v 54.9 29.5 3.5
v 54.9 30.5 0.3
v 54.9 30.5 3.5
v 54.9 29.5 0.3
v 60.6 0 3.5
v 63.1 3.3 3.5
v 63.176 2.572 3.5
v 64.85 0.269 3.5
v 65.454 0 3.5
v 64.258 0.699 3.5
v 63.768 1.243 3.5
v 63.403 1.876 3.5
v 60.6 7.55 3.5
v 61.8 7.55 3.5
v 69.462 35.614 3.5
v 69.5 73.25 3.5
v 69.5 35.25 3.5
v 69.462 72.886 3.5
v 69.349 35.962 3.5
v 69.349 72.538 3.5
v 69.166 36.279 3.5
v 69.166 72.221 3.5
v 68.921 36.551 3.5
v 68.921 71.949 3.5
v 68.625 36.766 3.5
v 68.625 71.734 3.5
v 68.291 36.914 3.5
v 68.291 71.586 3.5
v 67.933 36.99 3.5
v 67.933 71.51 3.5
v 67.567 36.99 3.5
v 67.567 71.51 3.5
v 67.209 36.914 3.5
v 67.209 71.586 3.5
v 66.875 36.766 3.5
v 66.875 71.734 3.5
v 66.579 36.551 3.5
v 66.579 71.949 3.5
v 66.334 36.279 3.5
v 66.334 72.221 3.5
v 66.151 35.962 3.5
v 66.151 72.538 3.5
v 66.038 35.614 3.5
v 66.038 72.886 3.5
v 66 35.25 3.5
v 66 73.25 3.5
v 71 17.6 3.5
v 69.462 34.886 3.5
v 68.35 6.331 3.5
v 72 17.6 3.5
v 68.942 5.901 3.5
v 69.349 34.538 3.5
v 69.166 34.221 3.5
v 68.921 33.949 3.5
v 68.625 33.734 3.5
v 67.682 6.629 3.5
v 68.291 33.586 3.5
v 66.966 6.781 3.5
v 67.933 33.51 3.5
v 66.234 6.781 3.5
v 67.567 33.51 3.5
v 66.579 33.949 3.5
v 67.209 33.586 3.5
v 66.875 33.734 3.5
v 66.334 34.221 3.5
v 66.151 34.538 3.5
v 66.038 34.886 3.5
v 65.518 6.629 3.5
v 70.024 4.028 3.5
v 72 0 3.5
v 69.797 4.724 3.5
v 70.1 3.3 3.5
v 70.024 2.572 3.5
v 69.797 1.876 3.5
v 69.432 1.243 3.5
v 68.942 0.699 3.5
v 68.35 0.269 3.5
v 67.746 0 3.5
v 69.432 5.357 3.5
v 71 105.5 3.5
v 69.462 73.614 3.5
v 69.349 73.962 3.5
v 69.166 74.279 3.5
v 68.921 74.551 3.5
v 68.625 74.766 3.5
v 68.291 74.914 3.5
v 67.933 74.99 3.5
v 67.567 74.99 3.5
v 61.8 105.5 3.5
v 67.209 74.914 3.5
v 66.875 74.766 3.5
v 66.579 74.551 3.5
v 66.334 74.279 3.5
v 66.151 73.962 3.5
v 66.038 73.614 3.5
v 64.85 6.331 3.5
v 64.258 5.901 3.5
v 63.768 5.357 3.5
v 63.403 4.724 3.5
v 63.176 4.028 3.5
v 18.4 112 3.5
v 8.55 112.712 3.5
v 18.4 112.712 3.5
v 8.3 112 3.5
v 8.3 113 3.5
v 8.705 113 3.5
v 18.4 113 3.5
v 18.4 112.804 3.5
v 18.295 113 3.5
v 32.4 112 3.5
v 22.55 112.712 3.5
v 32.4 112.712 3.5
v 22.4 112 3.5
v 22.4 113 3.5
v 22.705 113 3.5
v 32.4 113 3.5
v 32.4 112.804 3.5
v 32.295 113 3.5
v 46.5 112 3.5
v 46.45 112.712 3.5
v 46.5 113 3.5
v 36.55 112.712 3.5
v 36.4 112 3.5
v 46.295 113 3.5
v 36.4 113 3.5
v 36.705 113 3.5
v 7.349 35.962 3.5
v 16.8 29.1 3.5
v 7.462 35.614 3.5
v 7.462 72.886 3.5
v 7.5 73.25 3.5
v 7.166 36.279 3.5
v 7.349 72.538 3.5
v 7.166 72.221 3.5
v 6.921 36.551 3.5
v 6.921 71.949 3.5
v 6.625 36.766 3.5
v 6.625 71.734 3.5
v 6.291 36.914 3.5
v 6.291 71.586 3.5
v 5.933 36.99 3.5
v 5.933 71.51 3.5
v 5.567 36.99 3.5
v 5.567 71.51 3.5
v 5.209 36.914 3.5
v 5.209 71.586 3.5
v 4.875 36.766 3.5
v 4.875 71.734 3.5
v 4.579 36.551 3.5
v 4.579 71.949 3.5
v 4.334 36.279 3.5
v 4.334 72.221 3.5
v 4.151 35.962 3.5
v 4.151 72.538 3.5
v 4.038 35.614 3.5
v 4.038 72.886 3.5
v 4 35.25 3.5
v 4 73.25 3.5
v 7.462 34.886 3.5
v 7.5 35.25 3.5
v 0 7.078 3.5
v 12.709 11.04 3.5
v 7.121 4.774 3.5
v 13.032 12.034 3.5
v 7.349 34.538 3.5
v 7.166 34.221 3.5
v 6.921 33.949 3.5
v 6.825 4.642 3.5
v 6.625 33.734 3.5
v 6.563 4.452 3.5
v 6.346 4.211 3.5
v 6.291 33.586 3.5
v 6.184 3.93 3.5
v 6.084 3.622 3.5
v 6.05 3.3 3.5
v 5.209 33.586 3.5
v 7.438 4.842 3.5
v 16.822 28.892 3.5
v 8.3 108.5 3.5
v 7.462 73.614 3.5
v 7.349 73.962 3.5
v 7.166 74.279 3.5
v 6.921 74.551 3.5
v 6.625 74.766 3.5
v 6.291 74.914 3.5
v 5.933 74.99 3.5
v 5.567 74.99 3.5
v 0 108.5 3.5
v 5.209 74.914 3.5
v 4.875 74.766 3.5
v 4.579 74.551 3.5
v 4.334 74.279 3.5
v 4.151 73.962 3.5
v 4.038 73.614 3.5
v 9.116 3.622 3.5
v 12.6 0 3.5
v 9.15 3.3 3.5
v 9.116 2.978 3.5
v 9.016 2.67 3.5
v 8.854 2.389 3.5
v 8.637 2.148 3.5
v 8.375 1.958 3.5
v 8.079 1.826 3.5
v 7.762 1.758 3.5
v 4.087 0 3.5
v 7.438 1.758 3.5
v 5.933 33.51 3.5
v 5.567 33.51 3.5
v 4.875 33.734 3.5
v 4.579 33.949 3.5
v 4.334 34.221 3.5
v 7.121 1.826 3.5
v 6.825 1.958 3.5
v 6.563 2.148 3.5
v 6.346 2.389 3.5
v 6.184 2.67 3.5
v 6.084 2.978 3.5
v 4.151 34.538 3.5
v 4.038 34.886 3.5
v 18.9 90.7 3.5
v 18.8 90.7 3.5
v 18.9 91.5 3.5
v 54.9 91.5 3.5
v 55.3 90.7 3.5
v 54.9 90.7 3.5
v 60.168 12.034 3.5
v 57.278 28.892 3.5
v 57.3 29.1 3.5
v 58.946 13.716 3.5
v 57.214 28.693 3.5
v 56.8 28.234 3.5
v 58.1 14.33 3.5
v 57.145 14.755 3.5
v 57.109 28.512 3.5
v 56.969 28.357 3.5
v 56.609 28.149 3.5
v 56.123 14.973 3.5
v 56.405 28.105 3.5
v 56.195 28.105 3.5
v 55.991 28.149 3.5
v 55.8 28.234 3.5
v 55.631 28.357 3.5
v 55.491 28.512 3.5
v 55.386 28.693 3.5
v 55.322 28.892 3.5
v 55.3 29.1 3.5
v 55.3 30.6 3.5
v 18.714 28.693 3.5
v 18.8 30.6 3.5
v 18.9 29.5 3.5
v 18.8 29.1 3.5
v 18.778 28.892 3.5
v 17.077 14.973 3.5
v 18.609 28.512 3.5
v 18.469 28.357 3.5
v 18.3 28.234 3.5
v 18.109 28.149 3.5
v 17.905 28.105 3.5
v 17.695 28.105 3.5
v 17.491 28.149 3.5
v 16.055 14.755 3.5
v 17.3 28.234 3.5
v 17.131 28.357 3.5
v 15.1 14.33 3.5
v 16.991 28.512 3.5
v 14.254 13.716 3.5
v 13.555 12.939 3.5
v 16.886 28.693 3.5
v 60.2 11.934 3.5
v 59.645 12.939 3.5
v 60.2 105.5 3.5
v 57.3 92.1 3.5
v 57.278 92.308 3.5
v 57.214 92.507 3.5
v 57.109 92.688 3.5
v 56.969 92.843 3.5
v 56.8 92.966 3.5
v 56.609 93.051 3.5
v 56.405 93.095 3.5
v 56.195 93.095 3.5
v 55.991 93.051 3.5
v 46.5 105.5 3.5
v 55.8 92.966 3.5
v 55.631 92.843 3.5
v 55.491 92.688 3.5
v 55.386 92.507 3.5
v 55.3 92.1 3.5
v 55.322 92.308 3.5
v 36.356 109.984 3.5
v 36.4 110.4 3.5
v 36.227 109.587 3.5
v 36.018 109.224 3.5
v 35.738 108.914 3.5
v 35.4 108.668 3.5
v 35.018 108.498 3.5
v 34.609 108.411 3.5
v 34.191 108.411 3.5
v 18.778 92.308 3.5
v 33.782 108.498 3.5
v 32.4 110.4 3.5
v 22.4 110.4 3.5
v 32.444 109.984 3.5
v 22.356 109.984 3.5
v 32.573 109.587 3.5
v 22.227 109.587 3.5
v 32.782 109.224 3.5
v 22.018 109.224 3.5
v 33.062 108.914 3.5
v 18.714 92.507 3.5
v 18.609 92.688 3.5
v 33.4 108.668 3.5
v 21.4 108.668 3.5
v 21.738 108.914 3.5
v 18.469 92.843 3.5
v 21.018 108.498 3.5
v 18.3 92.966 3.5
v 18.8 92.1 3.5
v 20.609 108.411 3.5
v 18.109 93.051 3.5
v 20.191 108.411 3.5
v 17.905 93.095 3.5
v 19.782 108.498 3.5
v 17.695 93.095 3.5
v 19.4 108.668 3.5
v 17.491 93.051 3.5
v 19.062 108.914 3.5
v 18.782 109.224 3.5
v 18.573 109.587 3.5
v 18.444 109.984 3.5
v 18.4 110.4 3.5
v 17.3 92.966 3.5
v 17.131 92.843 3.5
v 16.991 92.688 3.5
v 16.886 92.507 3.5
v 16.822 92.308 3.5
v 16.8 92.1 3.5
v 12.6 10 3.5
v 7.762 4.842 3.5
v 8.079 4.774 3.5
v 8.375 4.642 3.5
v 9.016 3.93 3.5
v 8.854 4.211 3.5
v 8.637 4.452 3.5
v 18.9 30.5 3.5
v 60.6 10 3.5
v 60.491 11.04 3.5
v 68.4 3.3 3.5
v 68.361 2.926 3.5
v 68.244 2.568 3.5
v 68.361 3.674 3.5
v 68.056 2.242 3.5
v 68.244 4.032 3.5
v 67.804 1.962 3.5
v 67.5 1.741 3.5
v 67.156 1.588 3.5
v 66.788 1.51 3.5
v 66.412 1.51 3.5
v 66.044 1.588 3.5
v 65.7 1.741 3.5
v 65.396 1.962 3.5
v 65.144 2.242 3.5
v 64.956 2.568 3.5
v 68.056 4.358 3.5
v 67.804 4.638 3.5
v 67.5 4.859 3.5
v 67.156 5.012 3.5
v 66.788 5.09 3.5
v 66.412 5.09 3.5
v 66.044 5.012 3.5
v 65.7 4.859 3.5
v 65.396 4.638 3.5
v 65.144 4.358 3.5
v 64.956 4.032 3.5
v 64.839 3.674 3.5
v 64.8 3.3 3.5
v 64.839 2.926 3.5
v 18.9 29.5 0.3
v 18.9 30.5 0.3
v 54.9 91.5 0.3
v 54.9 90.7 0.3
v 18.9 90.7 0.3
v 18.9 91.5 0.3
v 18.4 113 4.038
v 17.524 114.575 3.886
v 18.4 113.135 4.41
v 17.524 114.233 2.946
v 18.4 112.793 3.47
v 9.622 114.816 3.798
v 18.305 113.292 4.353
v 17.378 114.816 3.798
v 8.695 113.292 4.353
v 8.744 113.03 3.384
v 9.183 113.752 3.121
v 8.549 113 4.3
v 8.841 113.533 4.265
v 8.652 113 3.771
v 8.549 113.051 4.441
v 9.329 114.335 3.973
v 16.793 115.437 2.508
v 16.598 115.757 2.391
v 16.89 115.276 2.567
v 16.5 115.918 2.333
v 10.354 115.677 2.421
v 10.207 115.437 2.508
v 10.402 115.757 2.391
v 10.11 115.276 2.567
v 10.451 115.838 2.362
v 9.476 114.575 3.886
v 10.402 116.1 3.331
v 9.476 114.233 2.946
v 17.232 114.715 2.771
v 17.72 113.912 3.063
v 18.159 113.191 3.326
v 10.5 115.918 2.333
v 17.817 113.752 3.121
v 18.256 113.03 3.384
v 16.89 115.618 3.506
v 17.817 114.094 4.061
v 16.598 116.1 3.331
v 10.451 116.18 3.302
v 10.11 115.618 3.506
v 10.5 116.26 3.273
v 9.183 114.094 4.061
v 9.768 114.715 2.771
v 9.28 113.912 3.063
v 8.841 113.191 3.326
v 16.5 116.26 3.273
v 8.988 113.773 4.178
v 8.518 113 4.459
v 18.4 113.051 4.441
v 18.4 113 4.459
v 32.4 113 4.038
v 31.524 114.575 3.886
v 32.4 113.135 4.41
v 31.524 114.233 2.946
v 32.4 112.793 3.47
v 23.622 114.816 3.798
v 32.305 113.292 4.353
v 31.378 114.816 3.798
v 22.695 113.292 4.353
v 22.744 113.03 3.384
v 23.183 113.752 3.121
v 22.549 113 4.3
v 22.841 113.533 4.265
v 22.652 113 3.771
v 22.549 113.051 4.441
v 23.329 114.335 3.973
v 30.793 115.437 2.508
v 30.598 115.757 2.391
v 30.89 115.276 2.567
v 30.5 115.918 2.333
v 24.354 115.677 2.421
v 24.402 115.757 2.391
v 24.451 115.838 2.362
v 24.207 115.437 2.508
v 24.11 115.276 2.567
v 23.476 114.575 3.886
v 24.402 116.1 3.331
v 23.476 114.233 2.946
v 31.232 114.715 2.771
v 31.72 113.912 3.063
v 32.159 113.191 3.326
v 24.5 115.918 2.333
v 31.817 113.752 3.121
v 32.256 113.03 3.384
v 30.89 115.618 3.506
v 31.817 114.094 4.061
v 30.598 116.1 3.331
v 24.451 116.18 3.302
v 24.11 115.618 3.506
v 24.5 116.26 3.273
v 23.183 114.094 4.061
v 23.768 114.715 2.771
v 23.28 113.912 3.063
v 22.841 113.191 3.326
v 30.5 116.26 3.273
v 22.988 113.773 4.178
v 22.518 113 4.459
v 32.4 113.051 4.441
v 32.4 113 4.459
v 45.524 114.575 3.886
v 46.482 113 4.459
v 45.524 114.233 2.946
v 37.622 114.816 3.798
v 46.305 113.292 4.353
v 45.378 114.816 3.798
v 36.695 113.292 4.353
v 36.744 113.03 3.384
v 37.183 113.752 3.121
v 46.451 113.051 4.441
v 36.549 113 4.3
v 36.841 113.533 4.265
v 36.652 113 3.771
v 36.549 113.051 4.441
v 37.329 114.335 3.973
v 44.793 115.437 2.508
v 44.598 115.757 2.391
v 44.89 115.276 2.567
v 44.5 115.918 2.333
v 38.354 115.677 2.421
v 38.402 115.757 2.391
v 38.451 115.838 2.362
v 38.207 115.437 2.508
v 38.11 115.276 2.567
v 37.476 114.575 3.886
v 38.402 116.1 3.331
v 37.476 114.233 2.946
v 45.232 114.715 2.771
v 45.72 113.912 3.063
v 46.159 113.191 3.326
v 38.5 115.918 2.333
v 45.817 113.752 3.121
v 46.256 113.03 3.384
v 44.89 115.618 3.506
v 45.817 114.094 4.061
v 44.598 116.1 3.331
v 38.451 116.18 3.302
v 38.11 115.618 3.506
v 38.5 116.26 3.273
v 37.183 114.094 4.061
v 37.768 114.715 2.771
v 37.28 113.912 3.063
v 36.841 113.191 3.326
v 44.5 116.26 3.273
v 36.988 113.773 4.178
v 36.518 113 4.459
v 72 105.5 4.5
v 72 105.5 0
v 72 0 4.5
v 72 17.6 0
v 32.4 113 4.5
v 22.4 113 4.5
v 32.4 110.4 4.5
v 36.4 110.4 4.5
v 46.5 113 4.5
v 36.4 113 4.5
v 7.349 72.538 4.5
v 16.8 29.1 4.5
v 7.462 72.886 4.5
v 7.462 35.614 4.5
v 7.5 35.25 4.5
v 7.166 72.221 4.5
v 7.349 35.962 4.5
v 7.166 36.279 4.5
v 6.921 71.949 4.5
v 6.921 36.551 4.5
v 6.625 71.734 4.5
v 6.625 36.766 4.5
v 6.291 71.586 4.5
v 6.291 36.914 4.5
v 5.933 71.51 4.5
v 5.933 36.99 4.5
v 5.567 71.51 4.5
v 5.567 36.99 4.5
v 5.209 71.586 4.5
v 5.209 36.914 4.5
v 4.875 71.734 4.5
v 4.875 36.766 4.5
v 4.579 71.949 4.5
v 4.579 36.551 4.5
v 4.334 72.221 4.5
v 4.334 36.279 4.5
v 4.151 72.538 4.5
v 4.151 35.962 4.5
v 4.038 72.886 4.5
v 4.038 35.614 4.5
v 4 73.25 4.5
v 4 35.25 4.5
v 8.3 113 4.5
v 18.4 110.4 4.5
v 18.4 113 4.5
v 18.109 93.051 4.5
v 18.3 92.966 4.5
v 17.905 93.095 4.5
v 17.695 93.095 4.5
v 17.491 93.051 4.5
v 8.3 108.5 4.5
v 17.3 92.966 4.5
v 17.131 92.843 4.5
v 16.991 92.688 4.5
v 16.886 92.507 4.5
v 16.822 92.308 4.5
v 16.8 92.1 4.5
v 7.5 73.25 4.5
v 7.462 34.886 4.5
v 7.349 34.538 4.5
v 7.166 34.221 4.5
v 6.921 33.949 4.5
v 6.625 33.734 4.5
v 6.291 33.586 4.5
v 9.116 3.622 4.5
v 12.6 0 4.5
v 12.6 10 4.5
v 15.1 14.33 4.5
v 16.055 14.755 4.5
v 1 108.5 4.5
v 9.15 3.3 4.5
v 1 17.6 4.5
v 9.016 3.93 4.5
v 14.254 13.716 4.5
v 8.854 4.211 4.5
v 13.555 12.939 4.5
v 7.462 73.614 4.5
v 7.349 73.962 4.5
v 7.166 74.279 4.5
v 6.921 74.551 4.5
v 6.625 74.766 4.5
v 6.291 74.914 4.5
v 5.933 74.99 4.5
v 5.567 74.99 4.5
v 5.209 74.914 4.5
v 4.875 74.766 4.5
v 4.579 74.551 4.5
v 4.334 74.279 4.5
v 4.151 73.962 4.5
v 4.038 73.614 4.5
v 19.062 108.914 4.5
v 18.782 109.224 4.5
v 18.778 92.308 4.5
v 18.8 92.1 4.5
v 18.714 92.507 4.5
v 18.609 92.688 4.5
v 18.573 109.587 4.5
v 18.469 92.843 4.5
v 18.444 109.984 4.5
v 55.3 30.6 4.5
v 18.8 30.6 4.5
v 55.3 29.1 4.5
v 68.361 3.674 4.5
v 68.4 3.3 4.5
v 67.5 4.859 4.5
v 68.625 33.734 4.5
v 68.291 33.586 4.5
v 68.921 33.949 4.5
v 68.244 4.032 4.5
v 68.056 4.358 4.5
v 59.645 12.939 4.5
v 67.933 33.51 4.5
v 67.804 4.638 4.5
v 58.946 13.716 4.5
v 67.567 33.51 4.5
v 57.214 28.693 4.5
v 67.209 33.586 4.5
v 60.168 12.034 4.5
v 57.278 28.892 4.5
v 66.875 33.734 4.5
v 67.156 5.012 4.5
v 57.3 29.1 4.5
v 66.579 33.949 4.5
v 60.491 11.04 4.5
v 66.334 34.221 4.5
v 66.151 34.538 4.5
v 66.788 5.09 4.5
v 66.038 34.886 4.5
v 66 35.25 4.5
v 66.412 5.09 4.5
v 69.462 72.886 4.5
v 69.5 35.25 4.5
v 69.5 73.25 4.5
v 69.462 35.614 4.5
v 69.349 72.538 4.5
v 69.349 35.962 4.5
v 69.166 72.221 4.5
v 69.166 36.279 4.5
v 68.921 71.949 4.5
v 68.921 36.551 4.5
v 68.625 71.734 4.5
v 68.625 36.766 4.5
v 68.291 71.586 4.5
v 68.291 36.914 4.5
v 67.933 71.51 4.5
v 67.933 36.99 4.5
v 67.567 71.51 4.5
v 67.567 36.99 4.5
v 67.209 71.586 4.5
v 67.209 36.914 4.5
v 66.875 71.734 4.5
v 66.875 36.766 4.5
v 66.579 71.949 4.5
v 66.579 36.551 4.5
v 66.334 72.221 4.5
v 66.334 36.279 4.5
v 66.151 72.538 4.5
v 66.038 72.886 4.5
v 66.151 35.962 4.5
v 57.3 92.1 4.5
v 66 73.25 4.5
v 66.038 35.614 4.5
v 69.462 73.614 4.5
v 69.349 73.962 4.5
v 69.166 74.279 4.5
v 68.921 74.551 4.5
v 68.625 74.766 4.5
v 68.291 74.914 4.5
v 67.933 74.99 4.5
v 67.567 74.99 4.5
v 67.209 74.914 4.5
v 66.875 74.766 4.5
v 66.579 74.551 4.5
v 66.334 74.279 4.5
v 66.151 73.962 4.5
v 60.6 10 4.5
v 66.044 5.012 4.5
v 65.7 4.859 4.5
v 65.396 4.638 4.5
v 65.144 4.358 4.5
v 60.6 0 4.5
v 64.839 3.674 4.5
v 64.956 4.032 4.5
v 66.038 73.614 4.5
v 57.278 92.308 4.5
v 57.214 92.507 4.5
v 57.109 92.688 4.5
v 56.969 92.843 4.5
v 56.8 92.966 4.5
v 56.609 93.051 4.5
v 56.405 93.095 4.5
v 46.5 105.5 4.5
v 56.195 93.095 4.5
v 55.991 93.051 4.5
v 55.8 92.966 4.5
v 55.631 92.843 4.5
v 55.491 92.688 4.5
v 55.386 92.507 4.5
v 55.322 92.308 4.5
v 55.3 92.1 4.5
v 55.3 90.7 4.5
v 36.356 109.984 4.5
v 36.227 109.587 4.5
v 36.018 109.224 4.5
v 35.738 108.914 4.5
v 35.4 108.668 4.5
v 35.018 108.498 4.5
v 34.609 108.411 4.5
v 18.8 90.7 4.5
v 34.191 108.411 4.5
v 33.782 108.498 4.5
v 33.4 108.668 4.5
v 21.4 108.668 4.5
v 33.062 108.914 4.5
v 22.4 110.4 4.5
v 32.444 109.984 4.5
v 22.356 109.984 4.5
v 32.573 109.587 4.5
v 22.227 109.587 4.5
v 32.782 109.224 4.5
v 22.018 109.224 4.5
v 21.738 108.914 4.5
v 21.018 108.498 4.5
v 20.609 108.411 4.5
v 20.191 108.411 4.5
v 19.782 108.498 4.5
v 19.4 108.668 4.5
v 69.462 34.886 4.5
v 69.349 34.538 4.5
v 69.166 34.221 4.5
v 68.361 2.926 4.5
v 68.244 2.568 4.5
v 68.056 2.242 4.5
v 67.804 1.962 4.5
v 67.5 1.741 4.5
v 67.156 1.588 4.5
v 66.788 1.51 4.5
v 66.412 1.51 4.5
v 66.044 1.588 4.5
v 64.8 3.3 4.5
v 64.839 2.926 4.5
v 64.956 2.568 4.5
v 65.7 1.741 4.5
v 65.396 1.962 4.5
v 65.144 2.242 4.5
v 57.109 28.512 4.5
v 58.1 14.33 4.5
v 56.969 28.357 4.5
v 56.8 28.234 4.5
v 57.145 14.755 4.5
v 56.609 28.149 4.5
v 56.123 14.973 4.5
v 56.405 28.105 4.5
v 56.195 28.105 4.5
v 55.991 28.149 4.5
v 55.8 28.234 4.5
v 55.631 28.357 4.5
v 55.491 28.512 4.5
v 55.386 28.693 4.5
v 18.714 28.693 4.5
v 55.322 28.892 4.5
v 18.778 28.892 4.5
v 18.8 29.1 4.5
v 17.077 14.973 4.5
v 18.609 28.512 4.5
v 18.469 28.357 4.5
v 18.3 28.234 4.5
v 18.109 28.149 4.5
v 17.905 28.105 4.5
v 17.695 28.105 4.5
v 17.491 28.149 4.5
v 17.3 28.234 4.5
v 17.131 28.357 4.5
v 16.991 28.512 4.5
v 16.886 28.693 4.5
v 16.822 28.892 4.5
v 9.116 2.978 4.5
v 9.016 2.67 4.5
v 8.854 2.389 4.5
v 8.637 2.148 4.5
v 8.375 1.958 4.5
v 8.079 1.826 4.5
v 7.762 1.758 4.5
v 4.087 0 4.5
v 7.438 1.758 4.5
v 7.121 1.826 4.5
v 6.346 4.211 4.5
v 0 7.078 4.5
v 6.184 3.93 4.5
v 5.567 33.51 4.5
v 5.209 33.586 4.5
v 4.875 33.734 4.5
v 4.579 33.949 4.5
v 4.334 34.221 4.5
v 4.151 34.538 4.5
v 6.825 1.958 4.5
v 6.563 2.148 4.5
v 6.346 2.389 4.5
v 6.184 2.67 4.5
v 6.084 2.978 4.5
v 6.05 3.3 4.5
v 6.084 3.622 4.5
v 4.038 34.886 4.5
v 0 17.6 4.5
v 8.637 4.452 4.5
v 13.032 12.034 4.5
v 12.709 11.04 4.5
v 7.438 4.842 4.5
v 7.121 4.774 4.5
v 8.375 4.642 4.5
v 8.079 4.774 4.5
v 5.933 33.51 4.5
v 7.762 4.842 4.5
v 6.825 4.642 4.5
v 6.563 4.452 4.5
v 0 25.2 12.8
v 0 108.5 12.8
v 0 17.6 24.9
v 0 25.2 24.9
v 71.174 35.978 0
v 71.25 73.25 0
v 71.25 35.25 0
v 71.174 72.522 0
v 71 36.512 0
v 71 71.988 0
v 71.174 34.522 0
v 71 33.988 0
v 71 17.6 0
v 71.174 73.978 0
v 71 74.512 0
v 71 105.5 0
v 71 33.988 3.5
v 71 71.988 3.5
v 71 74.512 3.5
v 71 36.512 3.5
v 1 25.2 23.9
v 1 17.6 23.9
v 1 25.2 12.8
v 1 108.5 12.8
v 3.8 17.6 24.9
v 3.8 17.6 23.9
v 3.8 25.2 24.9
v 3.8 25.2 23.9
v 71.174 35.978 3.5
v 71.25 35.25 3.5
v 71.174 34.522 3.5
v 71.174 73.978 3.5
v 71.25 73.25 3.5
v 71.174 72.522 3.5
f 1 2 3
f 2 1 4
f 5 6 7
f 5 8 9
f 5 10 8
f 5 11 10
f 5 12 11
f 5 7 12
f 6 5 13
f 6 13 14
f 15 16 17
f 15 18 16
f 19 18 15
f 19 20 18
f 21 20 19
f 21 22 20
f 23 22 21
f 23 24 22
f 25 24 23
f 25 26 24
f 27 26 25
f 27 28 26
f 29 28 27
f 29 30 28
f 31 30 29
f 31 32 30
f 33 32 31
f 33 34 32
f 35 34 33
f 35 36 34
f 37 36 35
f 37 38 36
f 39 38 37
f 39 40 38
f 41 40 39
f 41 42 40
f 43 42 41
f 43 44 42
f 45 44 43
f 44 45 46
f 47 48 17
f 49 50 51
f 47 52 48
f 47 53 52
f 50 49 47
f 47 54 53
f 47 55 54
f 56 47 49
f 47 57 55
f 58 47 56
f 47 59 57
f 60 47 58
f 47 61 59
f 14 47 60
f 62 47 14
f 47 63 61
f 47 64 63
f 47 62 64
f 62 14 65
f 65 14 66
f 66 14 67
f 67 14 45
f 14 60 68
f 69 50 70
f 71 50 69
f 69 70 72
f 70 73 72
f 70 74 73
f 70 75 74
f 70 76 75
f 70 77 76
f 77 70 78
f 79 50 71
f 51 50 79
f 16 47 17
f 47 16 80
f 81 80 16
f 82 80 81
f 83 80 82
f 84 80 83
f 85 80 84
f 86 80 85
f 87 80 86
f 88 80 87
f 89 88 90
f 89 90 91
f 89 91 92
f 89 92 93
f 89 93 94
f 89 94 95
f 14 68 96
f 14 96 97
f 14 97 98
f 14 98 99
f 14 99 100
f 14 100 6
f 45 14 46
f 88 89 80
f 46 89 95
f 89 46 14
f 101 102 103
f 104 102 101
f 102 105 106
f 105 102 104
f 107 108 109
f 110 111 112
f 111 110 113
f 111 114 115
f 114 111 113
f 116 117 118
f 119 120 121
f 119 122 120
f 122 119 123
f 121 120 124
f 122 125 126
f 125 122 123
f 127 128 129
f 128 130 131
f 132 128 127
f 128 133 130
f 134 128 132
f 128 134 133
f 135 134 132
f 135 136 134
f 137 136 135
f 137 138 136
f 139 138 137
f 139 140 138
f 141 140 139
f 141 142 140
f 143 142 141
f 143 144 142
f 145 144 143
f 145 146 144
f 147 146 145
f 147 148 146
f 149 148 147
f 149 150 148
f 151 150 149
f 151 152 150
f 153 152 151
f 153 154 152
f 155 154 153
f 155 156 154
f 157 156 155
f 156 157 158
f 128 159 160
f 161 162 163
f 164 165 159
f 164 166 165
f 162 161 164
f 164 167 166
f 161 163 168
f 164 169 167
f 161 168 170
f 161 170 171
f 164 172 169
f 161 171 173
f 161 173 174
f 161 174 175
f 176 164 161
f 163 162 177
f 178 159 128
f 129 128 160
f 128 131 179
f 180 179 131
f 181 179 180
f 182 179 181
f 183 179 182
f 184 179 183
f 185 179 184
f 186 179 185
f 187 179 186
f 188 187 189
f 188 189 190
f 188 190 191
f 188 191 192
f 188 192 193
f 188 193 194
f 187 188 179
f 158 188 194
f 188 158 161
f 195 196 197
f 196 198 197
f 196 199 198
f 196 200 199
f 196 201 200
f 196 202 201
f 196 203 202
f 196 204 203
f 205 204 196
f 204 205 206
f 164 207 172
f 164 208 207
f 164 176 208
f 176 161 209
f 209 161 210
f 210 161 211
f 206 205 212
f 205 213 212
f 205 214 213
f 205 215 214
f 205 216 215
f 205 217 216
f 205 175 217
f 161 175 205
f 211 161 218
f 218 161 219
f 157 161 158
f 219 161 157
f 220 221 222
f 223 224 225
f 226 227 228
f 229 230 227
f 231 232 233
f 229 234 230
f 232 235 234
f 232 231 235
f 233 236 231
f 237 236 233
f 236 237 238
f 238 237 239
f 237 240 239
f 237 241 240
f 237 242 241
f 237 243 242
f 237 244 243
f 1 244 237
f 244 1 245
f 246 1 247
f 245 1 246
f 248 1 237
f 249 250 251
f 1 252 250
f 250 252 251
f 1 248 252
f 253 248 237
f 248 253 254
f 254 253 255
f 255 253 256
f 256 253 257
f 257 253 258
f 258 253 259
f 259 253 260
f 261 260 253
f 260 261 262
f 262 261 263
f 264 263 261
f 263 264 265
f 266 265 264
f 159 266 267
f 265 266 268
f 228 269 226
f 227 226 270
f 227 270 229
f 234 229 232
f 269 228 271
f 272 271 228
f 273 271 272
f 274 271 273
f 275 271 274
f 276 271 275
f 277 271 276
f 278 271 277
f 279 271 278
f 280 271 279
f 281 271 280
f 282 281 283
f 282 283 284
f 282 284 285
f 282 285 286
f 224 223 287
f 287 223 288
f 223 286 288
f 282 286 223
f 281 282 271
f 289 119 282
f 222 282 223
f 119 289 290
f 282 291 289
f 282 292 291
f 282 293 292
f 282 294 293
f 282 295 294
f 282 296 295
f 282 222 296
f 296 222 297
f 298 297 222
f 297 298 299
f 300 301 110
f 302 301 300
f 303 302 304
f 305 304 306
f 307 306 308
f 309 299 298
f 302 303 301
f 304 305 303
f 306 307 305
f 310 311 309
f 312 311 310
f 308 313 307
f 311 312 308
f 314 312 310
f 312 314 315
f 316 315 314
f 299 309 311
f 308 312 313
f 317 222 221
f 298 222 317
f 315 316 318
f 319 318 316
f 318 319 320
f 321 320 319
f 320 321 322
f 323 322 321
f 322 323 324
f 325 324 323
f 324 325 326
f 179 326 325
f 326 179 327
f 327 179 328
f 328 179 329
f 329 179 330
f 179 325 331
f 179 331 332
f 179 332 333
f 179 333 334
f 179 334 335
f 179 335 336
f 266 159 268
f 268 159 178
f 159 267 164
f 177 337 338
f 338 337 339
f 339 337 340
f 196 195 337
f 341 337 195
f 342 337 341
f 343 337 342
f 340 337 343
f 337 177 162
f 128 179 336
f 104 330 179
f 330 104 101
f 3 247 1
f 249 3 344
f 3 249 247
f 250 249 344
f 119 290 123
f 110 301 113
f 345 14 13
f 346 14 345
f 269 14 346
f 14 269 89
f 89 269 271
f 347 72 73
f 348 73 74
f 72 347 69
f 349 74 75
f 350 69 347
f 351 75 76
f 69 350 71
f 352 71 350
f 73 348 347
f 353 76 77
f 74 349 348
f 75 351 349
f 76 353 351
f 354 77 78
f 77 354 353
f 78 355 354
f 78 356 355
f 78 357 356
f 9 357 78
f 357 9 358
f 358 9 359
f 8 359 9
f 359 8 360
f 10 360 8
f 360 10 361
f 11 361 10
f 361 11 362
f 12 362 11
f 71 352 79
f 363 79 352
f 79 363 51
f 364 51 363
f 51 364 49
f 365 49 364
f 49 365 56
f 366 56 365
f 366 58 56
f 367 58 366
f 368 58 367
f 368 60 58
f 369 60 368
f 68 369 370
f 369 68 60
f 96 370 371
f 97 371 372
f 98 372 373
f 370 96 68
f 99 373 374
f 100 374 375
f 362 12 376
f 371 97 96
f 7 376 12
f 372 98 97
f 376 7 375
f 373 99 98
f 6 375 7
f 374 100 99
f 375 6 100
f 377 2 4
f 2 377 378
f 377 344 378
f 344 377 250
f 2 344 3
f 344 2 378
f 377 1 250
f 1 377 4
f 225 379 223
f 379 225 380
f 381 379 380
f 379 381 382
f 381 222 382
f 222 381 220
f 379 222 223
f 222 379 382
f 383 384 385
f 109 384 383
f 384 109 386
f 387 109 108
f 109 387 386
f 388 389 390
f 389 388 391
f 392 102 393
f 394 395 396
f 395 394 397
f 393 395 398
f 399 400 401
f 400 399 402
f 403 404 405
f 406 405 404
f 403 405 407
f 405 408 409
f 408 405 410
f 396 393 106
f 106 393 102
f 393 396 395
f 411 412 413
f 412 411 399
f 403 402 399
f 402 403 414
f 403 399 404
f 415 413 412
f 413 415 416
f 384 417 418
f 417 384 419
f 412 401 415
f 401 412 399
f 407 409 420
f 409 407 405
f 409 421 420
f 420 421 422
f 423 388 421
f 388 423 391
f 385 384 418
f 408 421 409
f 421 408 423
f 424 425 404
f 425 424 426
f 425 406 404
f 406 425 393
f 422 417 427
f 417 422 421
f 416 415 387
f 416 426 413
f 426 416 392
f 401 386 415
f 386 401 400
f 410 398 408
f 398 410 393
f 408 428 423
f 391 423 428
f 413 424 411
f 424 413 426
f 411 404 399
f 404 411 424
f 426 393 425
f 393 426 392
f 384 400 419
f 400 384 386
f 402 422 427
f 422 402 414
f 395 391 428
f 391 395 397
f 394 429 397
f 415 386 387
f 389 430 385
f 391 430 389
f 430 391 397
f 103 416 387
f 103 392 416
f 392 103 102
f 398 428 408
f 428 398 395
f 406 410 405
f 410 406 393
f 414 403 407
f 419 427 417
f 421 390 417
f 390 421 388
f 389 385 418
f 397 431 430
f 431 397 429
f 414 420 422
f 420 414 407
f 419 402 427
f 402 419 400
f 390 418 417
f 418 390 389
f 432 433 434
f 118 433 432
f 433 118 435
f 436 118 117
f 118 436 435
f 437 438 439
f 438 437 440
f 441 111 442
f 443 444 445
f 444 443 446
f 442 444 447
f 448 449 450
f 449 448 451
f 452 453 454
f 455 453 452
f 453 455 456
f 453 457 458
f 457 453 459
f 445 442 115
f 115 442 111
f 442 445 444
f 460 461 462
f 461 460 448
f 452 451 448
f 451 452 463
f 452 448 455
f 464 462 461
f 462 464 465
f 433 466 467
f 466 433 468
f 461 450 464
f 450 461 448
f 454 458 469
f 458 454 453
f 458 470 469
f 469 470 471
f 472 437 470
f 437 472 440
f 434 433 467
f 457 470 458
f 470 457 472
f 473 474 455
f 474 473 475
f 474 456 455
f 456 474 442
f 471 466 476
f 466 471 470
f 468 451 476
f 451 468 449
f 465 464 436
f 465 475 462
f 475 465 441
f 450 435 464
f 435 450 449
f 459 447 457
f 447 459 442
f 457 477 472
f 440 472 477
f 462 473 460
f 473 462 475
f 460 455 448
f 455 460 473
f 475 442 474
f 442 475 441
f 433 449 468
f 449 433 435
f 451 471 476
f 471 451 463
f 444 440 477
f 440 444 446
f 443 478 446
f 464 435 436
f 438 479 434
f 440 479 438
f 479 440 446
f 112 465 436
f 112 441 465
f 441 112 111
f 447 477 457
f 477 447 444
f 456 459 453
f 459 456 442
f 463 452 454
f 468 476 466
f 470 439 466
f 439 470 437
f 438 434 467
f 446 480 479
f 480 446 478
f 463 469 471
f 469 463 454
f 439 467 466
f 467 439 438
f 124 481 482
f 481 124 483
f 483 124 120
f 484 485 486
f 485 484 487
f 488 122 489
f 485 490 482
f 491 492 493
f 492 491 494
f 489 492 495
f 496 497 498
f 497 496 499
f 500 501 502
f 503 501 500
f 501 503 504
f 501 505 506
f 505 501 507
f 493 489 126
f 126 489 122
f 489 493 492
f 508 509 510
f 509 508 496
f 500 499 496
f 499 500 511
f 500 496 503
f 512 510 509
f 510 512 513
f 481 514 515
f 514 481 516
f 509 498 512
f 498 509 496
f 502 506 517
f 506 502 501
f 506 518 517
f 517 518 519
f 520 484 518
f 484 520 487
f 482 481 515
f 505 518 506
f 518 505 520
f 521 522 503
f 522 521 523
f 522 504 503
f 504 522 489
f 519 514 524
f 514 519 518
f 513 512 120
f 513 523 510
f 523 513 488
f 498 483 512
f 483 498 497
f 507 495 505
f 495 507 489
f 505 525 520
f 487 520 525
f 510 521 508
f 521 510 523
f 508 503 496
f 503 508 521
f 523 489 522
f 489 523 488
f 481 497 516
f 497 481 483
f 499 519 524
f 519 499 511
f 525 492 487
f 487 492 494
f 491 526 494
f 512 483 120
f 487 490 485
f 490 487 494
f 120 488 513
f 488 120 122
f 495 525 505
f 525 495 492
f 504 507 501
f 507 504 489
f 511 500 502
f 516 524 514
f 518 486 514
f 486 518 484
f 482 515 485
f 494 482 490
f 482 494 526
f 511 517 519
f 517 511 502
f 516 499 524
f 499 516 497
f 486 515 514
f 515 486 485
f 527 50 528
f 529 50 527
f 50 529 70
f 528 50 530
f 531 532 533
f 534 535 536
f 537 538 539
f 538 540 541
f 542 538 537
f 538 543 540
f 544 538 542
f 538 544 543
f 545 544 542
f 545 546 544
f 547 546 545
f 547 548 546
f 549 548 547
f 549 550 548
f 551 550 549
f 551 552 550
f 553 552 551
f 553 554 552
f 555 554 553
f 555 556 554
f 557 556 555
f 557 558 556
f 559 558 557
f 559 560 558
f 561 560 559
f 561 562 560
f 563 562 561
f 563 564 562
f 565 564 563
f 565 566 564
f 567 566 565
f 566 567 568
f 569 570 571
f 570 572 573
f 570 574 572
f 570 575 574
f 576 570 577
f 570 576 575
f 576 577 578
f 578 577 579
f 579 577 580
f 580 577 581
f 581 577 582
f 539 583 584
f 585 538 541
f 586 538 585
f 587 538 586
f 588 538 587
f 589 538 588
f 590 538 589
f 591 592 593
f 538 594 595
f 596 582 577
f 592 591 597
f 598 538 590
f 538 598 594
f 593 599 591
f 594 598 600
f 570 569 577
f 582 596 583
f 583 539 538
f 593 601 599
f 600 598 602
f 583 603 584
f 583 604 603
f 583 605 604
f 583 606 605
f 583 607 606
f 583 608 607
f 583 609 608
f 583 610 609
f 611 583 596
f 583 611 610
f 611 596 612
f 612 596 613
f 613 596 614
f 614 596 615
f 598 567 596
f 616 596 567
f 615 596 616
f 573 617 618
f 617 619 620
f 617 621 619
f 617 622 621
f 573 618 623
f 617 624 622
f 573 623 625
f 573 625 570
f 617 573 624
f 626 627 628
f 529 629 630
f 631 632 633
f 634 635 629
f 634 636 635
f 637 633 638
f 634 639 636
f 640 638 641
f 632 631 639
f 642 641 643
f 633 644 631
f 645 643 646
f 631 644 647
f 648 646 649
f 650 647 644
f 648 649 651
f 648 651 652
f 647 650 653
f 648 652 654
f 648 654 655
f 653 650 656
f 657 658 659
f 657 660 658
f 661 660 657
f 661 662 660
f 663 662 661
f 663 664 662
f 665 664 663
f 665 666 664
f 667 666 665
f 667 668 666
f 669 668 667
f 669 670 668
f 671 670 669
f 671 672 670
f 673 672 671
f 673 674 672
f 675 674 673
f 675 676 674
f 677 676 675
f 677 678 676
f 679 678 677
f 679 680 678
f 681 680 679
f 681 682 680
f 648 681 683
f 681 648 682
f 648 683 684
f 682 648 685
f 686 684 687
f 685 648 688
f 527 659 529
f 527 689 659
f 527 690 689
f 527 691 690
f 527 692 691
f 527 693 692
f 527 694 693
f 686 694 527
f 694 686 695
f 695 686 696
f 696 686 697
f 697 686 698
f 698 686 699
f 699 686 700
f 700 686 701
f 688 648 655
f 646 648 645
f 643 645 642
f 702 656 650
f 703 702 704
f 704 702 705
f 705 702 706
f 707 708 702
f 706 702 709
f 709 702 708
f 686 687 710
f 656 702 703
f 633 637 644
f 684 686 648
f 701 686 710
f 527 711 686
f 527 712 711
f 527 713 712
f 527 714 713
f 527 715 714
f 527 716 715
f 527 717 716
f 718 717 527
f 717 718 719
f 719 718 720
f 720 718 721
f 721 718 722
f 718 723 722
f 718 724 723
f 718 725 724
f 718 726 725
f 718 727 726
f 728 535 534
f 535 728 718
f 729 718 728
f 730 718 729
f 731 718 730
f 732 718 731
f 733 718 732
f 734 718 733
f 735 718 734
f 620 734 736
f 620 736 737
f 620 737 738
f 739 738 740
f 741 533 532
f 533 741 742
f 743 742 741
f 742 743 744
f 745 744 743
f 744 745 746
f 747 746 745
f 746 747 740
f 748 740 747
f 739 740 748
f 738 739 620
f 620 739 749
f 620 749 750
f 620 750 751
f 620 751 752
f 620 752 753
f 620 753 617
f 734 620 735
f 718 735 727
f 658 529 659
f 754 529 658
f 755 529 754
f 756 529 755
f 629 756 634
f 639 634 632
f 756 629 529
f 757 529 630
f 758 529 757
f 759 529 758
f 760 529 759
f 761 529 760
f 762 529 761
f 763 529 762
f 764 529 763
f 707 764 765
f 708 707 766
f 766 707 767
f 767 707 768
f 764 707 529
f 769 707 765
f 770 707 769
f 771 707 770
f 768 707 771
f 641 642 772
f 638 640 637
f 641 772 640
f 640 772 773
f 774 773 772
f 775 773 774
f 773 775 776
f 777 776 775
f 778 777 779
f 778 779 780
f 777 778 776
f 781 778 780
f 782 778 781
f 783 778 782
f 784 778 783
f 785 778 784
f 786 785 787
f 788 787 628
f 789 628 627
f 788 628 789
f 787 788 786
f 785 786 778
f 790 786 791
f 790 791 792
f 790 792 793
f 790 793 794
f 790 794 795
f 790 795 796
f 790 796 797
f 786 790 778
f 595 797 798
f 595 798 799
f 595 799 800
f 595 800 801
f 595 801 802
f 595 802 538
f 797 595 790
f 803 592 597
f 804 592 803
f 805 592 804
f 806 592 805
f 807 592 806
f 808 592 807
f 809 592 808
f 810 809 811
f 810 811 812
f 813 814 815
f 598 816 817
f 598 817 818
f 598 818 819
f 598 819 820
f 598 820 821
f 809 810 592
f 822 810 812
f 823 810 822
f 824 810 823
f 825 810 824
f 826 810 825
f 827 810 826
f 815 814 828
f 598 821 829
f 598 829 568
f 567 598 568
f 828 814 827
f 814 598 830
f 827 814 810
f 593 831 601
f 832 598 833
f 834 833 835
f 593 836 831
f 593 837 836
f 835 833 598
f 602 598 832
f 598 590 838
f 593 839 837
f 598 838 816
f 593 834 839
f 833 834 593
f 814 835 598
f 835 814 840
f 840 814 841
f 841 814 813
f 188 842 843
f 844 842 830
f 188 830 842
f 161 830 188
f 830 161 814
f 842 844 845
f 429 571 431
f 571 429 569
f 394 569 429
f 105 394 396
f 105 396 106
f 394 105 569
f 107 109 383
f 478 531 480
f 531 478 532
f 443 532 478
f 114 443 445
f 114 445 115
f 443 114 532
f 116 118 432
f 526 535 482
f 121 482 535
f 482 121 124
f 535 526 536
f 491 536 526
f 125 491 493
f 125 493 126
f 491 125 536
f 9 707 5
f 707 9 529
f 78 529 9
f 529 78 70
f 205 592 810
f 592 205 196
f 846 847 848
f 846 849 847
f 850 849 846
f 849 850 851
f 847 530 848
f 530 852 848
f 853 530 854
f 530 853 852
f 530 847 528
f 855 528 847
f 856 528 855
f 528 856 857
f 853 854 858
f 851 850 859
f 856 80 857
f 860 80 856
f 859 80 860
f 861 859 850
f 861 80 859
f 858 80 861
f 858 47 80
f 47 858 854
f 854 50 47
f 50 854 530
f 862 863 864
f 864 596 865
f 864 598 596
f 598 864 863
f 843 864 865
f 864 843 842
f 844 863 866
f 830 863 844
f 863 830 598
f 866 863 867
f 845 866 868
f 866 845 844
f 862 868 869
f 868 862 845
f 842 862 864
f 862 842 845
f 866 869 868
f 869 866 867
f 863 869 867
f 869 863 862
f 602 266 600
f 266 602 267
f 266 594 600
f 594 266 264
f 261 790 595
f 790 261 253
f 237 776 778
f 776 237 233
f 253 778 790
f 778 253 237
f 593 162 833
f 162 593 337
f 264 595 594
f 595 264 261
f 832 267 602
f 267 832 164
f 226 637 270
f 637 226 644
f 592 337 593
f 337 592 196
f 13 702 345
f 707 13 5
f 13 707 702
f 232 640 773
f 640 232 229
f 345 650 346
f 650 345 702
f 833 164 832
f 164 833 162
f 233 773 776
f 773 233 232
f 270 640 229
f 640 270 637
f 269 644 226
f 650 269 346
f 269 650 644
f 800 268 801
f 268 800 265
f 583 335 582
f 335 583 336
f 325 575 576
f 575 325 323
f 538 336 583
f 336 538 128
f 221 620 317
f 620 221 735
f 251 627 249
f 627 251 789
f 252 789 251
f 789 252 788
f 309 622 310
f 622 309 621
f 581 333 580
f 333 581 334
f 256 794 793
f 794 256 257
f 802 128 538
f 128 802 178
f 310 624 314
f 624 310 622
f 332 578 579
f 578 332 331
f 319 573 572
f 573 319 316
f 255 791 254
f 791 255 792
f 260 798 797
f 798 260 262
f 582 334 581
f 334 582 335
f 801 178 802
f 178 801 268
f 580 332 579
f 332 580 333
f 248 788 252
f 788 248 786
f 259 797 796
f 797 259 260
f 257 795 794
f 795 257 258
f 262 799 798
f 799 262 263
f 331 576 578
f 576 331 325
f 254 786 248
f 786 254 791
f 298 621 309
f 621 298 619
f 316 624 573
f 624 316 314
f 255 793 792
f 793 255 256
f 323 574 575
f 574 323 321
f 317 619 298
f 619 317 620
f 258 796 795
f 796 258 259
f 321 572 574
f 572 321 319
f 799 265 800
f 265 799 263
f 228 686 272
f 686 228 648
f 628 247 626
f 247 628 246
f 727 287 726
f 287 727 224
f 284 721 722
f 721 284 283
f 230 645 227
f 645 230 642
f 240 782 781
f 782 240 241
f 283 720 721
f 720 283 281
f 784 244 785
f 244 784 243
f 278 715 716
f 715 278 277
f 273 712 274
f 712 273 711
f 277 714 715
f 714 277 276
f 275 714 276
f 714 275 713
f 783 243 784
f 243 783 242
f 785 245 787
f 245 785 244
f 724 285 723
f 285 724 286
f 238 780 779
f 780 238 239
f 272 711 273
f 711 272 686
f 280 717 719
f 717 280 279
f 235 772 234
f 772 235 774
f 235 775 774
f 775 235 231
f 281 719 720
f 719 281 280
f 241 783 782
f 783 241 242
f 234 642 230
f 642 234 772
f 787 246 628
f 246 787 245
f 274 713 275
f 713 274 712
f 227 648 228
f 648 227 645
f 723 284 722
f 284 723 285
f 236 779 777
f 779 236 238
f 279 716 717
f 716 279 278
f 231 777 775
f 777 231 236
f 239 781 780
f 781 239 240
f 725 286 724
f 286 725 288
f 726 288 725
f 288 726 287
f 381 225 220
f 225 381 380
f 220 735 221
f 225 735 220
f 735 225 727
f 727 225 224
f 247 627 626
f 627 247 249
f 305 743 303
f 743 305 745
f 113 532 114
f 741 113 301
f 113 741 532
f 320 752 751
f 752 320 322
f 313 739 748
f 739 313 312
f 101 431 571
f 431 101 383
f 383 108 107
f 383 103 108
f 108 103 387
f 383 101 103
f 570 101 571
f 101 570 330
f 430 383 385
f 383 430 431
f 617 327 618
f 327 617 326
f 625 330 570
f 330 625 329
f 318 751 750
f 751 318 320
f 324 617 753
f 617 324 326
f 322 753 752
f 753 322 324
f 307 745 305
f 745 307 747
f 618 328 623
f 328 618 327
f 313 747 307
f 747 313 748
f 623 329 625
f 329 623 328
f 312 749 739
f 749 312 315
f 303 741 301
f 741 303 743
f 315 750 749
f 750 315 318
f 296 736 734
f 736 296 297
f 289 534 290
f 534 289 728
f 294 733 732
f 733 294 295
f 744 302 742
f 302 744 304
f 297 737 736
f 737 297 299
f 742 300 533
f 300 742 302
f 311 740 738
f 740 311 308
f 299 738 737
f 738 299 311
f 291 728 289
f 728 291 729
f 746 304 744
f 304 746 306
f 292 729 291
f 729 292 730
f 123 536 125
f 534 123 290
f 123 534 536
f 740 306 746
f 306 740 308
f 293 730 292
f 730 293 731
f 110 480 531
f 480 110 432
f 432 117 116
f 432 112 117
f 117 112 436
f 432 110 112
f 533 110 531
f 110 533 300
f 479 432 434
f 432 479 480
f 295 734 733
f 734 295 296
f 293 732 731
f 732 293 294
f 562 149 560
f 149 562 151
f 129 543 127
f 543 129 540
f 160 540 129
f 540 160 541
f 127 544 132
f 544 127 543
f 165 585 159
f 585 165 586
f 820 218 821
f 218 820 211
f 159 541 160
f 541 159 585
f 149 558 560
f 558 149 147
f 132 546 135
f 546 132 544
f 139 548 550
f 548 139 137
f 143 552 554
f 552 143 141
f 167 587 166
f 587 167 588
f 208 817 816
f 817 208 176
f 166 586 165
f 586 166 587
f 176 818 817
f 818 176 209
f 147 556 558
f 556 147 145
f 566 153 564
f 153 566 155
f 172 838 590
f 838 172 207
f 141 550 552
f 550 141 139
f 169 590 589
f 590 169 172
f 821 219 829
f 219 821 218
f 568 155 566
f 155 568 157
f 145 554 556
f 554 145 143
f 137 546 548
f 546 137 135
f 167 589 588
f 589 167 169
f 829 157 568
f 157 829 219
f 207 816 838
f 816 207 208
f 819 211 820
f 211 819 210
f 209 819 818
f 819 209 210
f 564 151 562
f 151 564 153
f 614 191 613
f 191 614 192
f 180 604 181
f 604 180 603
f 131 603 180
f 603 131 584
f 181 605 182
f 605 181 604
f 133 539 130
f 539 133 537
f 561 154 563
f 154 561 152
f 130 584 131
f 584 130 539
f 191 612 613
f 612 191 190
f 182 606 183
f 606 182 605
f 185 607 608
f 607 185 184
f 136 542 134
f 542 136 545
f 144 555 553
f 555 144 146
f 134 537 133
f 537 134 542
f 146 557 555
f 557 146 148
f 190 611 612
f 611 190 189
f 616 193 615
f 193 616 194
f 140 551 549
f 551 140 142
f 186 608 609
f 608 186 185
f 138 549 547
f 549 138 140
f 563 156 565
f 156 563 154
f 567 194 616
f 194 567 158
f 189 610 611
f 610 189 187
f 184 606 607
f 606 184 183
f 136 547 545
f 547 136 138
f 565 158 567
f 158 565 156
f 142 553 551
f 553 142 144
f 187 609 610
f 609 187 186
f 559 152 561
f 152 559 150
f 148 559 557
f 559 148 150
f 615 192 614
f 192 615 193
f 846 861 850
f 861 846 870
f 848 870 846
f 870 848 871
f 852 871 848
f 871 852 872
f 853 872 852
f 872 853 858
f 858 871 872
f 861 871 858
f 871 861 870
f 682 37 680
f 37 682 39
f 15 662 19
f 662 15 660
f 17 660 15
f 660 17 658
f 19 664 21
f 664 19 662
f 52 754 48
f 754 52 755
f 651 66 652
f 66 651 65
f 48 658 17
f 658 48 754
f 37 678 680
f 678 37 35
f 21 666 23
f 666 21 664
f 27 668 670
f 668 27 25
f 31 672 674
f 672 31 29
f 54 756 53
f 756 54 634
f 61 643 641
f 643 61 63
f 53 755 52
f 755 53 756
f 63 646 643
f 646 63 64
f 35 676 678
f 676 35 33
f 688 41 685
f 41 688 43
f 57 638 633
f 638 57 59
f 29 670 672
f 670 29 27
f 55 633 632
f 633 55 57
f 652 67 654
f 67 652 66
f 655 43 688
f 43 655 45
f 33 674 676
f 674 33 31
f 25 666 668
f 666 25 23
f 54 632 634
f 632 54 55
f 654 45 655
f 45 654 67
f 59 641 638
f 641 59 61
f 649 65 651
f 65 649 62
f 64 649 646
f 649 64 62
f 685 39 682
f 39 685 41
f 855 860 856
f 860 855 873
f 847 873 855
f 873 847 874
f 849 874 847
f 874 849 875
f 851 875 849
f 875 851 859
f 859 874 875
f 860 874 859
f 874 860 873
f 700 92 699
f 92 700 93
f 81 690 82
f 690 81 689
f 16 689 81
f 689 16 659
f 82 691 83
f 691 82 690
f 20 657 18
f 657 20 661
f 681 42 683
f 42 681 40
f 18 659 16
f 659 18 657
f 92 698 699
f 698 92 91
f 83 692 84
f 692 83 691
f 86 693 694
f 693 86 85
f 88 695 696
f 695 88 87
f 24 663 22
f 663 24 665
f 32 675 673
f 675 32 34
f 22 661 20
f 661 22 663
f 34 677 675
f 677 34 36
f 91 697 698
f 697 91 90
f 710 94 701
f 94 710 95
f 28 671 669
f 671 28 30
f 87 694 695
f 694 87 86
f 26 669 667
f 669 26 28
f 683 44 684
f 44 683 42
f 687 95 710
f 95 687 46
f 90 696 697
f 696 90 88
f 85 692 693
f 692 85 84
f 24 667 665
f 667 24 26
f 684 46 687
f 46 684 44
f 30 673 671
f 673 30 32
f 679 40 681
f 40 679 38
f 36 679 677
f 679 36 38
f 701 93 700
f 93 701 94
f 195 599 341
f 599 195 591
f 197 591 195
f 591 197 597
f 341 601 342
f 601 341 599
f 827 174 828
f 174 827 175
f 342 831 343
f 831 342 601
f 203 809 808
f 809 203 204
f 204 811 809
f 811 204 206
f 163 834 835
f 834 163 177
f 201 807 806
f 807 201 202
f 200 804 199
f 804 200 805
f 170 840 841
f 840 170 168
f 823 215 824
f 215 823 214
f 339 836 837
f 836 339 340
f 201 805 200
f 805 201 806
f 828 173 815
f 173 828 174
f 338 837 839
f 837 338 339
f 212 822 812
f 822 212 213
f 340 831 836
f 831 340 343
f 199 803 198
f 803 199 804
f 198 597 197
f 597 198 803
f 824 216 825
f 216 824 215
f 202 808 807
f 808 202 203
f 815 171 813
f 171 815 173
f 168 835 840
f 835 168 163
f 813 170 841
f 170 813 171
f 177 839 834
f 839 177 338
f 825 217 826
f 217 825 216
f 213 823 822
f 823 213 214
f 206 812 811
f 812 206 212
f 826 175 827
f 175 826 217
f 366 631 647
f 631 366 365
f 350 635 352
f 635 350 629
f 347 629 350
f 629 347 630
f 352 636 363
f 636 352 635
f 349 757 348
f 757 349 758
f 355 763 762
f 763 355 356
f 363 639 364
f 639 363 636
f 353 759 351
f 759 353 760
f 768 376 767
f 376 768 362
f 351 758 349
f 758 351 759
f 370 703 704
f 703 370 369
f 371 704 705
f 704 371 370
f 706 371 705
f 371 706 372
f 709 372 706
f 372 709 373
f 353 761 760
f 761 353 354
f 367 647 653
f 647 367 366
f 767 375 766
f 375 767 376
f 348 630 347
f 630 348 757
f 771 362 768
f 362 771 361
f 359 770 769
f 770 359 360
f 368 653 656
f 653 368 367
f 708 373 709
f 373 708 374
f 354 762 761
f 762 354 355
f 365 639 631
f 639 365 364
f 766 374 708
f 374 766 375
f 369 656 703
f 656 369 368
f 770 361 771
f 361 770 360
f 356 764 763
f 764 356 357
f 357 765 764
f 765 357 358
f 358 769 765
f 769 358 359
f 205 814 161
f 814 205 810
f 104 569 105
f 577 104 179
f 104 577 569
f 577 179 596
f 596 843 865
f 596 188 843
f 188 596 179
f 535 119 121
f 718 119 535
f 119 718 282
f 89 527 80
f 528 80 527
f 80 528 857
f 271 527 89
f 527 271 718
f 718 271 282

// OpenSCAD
// PowerBook 5xx Hard Disk Drive Caddy
// Copyright François Revol, 2025

/* [Printing options] */

// Variant
variant = 0; // [0:Original Metal Bracket - FOR REFERENCE,1:HDD 3D-printable - UNTESTED, 2:PB BlueSCSI v2 3D-printable]

// Optimize for FDM printers (less supports, larger details)
optimize_fdm = true;

/* [Preview] */

preview_parts = true;

/* [Hidden] */
$fs=0.1;

module pb5xx_hdd_caddy(variant=variant) {
    // metal thickness
    th = 1.0;
    slim = (variant == 2);
    slim_shave = 2.5;

    module hdd_screws(c=0) {
        for (dx=[0,1],dy=[0,1]) {
            translate([4+3.5/2+dx*62,33.5+3.5/2+dy*38,-0.1]) {
                cylinder(d=7,h=3.5+0.1);
                cylinder(d=3.5,h=10);
            }
        }
    }

    module caddy_screws(c=0) {
        for (dx=[0,1]) {
            translate([12.6-3.5-3/2+dx*59,1.8+3/2,-0.1]) {
                cylinder(d=6+dx+c,h=3.5+0.1);
                // one is thicker for some reason
                cylinder(d=3+dx*0.5+c,h=10);
                // limit need for support
                if (optimize_fdm && variant > 0)
                    translate([0,0,3.4]) cylinder(d1=7,d2=3,h=0.6);
            }
        }
    }

    module BS_screws(c=0,post=true) {
        for (d=[[35,0],[4.7,14],[48.8,48.6]])
            translate([8.3+d.x,37.5+d.y,4.5]) difference() {
                cylinder(d=4.9, h=4.7);
                //cylinder(d=2.85, h=5);
                cylinder(d=1.8, h=5);
            }
    }

    color(variant?"DodgerBlue":"silver") translate([0,0,(slim && !$preview)?-slim_shave:0])
        difference() {
            union() {
                if (variant) {
                    // base
                    translate([0,0,0]) cube([72, 113, 4.5]);
                    // vertical plates
                    if (variant < 2)
                        translate([0,17.6,3.5]) cube([th, 91, 3]);
                    if (variant == 1) {
                        translate([0,17.6,3.5]) cube([th, 7.6, 21.4]);
                    }
                    if (variant == 2) {
                        BS_screws(post=true);
                        for (d=[[3.6,44.2],[43.6,44.2]])
                            translate([8.3+d.x,37.5+d.y,4.5]) cylinder(d = 4, h = 4.7);
                     }
                    // the 3 prongs
                    for (dx=[0:2]) {
                        translate([8+10/2+0.5+dx*14, 112.8, 3.5+0.5]) rotate([-90-20,0,0]) linear_extrude(3.5, scale=[0.6,1]) square([10, th], center=true);
                        if (optimize_fdm && variant)
                            translate([8+10/2+0.5+dx*14, 115.9, 0]) linear_extrude(2.4, scale=[0.6,0.05]) square([10, 5], center=true);
                    }
                } else {
                    // metal frame :

                    // base plate
                    translate([0,0,3.5]) cube([72, 113, th]);
                    // vertical plates
                    translate([71,17.6,0]) cube([th, 88, 3.5]);
                    for (dy=[0,1])
                        translate([18.9,29.5+dy*61,0.3]) cube([36, th, 3.2]);
                    // these serve both for mecanical rigidity and grounding
                    translate([0,17.6,3.5]) cube([th, 91, 9.3]);
                    translate([0,17.6,3.5]) cube([th, 7.6, 21.4]);
                    translate([0,17.6,3.5+20.4]) cube([3.8, 7.6, th]);

                    // the 3 prongs
                    for (dx=[0:2]) {
                        translate([8+10/2+0.5+dx*14, 112.8, 3.5+0.5]) rotate([-90-20,0,0]) linear_extrude(3.5, scale=[0.6,1]) square([10, th], center=true);
                    }
                }
            }
            // room for connector
            for (i=[0,variant ? 1 : 0]) {
                translate([12.6,-1,i*2-0.1]) hull() {
                    cube([48,10+1,20]);
                    for (dx=[0,1])
                        translate([5+dx*38,10+1+i*variant*4,0]) cylinder(d=10+i*6, h=20);
                }
            }
            // large hole in the middle
            translate([17,30.6,-0.1]) {
                if (variant < 1)
                    cube([40.3,60.1,20]);
                else {
                    translate([0,10,0]) cube([40.3,37,20]);
                    translate([0,60,0]) cube([40.3,10,20]);
                }
                if (!variant) for (dx = [0,1]) hull() {
                    for (dy = [0,1])
                        translate([0.8+dx*38.5,-1.5+dy*63,0]) cylinder(d=2,h=20);
                }
            }
            if (variant == 2)
                for(dx = [0,1])
                    hull()
                        for(dy = [0,1])
                            translate([dx*72, 35+dy*55, -1]) cylinder(d=15, h=20);
            // minor cutouts
            translate([1.2,-3,-0.1]) rotate([0,0,30]) cube([4,12,20]);
            translate([-0.1,108.5,-0.1]) cube([8.4,10,20]);
            translate([46.5,105.5,-0.1]) cube([30,10,20]);
            for (dx=[0,1])
                hull() for(dy=[0,1]) {
                    translate([20.4+dx*14,110.4+dy*10,-0.1]) cylinder(d=4.0,h=20);
                }
            // 3D printed version removed volumes
            //translate([0,108.5,-0.1]) cube([50,4.6,3.5+0.1]);
            translate([0,112,0]) rotate([0,90,0]) cylinder(d=7,h=50,$fs=0.2);

            // room for the keyboard
            translate([59+2,7+55,-0.1]) linear_extrude(3.5+0.1,scale=[0.4,0.99]) square([4, 110], center=true);
            translate([12.6-3.5-3/2+59,1.8+3/2,-0.1])
                cylinder(d1=8,d2=7,h=3.5+0.1);

            if (slim)
                translate([-1, -1, -1]) cube([75, 120, slim_shave+1]);

            // 4 HDD screws
            if (variant < 2)
                hdd_screws();
            // 2 screws for the caddy itself
            caddy_screws(c=0.1);
        }

    if ($preview && preview_parts) {
        if (variant < 2)
            color("black", 0.5) hdd_screws();
        color("black", 0.5) caddy_screws();
        /*
        if (variant == 2)
            translate([4,-2,4.5]) color("White", 0.3) import("PBMountingBracket.stl");
        */
        // bbox
        //color("green", 0.2) cube([72, 115.6, 21.4+3.5]);
    }
}

pb5xx_hdd_caddy();
